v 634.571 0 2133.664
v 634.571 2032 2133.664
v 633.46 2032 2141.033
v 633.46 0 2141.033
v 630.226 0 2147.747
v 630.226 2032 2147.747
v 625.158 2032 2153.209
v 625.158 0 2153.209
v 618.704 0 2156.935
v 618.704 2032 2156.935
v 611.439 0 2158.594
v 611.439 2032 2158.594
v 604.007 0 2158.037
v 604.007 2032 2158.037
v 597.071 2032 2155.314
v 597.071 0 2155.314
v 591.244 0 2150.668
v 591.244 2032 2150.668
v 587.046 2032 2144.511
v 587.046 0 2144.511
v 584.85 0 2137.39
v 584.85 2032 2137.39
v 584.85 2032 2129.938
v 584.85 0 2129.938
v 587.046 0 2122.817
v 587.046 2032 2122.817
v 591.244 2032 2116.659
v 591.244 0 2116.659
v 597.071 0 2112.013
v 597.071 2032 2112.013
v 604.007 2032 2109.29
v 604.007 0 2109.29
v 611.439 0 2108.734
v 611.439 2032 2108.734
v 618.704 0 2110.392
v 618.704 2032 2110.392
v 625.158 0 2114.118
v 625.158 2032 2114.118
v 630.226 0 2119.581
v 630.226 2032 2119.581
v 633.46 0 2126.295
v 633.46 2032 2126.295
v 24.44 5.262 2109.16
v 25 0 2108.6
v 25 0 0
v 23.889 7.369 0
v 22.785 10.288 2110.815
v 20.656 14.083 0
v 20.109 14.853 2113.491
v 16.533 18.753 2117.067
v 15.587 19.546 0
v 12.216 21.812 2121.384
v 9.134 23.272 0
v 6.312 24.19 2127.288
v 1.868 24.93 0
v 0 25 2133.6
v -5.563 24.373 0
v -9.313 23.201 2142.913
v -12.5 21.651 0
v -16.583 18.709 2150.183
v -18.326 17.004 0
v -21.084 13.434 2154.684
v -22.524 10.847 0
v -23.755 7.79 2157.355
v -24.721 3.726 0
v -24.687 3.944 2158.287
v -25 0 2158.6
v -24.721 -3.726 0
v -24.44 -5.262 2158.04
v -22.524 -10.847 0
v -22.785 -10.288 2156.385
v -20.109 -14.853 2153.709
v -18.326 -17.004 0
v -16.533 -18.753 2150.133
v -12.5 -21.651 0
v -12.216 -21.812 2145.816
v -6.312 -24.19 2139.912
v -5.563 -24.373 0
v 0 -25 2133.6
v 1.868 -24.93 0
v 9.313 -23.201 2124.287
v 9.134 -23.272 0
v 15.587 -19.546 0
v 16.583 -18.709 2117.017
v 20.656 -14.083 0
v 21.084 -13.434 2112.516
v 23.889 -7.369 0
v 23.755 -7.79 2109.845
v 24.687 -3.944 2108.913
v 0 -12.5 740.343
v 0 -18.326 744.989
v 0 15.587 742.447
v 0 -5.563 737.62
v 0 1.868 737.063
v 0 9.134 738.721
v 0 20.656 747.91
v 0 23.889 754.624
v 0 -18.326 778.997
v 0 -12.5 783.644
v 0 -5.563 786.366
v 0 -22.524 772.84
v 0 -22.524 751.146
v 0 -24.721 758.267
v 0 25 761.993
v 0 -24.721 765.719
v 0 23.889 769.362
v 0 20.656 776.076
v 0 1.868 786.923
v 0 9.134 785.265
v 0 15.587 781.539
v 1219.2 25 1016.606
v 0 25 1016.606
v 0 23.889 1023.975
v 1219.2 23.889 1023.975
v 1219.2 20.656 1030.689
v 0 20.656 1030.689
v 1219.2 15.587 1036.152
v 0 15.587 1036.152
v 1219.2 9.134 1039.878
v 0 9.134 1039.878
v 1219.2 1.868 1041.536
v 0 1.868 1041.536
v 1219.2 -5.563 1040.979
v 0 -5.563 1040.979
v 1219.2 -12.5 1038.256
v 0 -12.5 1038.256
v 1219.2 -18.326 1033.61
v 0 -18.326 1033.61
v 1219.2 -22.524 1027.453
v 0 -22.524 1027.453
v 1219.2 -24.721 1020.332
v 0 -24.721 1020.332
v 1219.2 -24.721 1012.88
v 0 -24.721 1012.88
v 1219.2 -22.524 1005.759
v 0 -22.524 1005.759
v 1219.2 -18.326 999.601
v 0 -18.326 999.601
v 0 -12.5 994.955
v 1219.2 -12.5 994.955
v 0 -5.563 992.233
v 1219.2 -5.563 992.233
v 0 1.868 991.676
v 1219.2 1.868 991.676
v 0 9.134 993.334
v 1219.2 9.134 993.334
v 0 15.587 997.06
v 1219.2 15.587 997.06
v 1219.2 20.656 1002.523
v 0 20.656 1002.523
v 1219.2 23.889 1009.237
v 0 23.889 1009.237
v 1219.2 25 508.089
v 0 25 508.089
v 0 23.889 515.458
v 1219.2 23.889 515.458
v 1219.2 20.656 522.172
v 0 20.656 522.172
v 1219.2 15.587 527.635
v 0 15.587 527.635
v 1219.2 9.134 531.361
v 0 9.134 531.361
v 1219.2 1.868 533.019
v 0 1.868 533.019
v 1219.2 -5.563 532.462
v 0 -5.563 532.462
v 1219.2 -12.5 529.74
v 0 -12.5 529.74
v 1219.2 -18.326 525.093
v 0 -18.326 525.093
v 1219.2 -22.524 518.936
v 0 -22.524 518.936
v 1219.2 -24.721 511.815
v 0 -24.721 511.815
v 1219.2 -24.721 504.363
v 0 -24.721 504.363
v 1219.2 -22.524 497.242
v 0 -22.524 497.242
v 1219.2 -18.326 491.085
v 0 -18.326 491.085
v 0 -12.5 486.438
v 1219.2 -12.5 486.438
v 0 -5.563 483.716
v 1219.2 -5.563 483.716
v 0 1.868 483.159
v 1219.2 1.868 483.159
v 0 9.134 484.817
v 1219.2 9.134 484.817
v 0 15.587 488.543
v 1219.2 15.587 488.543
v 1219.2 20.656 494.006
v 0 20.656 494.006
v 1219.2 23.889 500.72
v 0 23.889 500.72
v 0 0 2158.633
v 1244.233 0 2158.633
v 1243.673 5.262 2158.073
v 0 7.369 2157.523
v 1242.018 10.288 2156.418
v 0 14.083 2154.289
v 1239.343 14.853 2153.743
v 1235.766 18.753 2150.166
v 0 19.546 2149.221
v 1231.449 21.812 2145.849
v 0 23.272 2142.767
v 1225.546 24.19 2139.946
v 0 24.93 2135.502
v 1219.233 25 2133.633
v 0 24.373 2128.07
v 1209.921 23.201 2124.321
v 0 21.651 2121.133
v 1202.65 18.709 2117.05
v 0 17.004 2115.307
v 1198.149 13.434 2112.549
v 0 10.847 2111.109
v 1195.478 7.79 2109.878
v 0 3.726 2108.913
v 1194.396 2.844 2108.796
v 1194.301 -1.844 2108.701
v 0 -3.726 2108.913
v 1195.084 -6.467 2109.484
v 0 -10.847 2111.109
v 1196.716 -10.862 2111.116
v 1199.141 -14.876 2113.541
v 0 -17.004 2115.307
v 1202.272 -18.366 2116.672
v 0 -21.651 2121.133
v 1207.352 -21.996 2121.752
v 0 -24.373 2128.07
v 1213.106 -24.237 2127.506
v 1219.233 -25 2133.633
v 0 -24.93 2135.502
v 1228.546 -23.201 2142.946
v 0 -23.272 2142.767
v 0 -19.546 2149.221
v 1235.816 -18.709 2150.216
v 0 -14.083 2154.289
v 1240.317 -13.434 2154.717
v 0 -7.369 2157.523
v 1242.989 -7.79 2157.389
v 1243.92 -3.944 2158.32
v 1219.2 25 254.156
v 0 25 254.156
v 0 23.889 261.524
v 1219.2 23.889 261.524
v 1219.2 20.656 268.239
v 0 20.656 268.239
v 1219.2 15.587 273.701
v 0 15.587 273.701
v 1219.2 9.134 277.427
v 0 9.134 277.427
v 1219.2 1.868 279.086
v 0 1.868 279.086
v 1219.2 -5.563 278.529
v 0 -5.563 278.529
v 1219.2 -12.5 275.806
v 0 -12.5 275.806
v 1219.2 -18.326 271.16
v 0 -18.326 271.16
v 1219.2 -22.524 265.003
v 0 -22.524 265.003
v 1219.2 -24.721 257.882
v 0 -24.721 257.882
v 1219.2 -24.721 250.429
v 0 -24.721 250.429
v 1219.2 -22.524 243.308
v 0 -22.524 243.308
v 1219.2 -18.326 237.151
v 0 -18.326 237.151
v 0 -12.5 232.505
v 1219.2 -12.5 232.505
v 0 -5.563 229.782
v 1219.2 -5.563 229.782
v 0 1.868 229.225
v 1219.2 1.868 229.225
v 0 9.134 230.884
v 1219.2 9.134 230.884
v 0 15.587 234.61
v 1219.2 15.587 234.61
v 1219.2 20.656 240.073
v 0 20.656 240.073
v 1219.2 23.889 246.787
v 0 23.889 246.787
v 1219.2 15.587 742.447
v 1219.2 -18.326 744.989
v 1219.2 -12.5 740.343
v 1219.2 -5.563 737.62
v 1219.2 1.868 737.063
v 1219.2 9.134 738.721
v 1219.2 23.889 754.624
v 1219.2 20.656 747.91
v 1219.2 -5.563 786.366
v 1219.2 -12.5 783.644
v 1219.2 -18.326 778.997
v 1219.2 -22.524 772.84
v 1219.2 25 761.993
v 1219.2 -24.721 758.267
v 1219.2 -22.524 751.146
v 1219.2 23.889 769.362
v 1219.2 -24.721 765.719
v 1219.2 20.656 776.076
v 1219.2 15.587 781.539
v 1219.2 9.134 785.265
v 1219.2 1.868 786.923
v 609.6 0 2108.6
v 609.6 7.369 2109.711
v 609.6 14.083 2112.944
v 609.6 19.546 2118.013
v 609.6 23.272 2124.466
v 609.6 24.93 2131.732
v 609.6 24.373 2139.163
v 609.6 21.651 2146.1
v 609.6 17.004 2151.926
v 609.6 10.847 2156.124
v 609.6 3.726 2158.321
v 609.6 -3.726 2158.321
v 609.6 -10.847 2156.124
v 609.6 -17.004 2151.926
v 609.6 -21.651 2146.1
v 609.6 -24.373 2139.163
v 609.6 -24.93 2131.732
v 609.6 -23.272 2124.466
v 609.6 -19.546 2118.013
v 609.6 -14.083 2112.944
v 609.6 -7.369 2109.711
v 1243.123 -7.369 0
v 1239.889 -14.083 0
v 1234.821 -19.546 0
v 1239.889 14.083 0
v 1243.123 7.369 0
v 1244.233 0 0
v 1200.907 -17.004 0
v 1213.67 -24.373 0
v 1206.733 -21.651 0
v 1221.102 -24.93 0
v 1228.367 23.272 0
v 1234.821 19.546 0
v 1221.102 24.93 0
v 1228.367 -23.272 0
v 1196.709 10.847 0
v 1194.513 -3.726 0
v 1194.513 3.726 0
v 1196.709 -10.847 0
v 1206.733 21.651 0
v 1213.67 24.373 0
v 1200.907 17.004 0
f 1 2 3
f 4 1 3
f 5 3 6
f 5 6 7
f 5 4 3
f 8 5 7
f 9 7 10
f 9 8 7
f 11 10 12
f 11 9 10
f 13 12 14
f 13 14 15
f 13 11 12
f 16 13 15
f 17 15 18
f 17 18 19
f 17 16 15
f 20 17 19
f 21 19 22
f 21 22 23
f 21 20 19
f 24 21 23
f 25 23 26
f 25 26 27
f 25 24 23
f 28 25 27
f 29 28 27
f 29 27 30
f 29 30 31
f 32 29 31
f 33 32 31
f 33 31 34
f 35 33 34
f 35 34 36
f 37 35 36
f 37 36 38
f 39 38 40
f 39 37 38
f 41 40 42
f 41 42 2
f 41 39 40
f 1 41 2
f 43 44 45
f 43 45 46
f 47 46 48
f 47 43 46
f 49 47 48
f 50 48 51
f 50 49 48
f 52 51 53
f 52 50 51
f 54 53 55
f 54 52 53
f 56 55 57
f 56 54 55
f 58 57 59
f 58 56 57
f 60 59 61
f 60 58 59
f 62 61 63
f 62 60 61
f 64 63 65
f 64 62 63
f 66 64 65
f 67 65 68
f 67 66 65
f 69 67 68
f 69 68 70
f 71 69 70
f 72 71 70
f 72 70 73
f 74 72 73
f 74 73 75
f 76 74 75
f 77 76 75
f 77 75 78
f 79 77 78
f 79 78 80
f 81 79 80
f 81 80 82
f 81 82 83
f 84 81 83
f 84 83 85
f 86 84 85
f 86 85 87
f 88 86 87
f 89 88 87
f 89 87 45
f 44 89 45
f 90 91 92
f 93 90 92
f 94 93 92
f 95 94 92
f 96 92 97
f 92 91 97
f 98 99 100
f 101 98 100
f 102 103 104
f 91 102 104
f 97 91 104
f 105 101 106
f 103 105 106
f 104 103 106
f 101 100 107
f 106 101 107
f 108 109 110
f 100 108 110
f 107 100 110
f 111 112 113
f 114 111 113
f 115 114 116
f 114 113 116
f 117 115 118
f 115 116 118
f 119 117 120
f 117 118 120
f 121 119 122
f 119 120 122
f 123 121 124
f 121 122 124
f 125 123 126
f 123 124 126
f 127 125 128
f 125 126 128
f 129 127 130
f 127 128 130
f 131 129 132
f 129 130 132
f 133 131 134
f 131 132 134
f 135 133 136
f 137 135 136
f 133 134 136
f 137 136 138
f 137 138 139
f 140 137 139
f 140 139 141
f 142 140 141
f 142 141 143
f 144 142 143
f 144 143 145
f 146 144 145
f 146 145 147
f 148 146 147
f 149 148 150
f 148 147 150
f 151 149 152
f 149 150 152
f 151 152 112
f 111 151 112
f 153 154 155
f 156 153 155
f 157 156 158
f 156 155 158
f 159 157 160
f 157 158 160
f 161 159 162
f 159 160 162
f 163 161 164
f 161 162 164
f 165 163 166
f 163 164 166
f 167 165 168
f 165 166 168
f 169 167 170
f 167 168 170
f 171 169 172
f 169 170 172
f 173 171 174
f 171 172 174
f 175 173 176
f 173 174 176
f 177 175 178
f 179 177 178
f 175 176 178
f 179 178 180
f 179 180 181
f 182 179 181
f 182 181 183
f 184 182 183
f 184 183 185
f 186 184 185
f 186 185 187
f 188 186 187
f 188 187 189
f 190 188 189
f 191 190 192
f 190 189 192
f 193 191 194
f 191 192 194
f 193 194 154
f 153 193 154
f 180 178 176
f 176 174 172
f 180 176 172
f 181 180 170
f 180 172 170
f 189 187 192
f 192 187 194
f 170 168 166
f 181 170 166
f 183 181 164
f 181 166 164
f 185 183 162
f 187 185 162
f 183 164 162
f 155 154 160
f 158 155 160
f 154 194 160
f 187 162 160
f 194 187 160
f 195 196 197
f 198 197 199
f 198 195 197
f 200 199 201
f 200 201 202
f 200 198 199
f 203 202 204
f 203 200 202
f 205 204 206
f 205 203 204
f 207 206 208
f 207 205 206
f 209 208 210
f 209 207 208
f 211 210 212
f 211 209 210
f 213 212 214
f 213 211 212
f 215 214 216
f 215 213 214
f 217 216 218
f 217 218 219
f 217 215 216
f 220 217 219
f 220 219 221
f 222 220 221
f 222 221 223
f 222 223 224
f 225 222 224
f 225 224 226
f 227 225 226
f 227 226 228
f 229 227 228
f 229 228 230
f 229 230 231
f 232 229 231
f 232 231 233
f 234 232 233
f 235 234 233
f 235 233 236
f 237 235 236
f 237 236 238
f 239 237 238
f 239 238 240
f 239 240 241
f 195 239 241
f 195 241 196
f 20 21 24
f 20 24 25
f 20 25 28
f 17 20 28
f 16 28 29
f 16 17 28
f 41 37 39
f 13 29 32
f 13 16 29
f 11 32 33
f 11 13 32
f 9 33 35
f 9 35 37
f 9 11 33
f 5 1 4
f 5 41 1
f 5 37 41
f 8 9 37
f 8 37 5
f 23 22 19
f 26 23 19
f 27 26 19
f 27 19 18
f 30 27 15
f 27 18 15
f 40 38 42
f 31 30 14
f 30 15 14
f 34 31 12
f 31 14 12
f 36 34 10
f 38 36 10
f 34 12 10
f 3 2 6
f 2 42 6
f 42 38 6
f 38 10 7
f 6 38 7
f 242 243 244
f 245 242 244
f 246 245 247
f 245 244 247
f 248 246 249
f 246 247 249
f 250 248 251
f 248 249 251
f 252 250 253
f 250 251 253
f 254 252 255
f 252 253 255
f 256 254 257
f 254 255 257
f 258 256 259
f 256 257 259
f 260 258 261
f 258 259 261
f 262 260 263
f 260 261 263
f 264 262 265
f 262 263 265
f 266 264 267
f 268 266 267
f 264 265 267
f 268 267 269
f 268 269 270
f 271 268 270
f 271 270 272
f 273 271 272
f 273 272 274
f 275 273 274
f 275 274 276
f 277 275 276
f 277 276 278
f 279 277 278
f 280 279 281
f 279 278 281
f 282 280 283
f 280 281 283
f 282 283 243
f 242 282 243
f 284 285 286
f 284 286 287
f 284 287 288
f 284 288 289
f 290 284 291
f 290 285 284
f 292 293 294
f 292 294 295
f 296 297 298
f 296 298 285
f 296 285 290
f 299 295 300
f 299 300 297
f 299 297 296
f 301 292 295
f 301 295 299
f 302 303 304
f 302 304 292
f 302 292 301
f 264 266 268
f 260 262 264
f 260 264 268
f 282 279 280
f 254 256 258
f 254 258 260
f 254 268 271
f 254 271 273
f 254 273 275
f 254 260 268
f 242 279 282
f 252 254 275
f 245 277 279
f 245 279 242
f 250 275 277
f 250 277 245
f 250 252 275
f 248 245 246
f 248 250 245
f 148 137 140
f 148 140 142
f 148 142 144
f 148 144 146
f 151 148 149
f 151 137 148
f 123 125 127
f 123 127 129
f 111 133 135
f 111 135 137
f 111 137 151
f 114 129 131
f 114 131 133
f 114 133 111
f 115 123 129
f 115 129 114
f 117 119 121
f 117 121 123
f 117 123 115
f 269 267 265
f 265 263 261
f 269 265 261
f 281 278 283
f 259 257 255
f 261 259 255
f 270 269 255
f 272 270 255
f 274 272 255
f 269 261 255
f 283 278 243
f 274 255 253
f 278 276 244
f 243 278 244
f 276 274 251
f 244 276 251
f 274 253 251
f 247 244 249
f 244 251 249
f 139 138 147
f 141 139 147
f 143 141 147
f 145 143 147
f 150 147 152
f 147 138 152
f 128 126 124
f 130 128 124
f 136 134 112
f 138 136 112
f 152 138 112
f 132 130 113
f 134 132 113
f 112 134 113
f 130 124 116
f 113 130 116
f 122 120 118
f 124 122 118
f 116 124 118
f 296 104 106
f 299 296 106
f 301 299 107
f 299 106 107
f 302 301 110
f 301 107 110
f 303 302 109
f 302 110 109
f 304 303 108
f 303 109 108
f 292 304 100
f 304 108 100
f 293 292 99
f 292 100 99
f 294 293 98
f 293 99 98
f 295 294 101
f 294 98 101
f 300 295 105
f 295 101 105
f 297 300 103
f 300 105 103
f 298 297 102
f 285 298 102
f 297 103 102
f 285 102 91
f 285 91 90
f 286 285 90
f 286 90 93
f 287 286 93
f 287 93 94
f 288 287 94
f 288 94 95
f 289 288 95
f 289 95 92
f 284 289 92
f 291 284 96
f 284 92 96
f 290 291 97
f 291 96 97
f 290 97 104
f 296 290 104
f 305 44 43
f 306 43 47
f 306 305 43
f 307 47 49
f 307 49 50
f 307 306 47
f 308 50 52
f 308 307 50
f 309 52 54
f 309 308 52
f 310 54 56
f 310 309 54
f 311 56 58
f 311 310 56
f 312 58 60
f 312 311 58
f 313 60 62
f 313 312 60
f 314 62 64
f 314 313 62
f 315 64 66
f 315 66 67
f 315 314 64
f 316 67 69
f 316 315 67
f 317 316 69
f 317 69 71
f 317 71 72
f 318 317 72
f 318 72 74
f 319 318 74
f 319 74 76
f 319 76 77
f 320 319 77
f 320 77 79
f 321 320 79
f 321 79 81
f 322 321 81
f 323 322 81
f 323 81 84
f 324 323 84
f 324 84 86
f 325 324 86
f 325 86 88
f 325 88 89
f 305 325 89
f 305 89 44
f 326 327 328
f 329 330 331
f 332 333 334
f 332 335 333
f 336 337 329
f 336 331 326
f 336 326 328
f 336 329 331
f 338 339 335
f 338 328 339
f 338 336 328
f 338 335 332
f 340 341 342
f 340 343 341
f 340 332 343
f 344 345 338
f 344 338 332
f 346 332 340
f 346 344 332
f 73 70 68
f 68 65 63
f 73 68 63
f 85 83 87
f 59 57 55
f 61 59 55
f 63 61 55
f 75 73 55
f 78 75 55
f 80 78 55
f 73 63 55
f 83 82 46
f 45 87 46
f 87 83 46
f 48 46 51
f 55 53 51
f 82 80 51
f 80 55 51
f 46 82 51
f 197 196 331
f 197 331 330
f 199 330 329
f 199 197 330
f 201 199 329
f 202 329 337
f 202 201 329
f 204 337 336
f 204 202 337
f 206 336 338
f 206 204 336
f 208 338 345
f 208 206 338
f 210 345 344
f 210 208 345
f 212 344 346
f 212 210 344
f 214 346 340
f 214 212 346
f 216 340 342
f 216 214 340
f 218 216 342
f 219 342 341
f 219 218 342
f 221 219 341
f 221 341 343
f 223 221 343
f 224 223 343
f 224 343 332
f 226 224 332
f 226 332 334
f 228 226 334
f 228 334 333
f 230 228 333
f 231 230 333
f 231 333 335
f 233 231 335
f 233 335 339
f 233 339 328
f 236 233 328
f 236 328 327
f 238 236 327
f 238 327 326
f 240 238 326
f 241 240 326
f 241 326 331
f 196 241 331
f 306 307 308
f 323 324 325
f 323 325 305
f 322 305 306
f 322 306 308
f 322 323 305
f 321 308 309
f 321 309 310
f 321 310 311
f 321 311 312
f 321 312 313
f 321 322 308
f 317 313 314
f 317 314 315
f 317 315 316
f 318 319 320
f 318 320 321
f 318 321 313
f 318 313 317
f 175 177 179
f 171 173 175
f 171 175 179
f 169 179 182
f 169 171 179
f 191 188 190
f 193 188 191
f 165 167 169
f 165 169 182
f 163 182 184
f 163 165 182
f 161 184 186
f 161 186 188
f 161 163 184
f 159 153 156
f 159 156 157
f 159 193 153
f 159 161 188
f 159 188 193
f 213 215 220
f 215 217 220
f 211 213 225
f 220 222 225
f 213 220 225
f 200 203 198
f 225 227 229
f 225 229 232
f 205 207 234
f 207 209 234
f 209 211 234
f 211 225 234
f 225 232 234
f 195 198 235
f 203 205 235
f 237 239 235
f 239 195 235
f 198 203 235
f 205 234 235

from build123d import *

# Parameters (mm, degrees)
F2_R      = 25
F3_DEPTH  = 2032
F0_R      = 25
F6_R      = 25
F9_R      = 25
F10_DEPTH = 1219.2


with BuildPart() as f3:
    # F2 (on Front) → F3 (new body)
    with BuildSketch(Plane.XZ):
        with Locations((609.5705032349, 2133.6636543274)):
            Circle(F2_R)
    extrude(amount=-F3_DEPTH)


with BuildPart() as f4:
    # F4: sweep along a path in F1
    with BuildLine(Plane.XZ) as f4_path:
        Line((0, 0), (0, 2133.6))
        Line((0, 2133.6), (609.6, 2133.6))
    # F0 (on Top) → F4 (sweep)
    with BuildSketch(Plane.XY):
        Circle(F0_R)
    sweep(path=f4_path.line, transition=Transition.RIGHT)


with BuildPart() as f7:
    # F7: sweep along a path in F1
    with BuildLine(Plane.XZ) as f7_path:
        Line((1219.2, 0), (1219.2, 2133.6))
        Line((1219.2, 2133.6), (0, 2133.6))
    # F6 (on line) → F7 (sweep)
    with BuildSketch(Plane(origin=(0, 0, 0), x_dir=(1, 0, 0), z_dir=(0, 0, -1))):
        with Locations((1219.2332744598, 0)):
            Circle(F6_R)
    sweep(path=f7_path.line, transition=Transition.RIGHT)


with BuildPart() as f10:
    # F9 (on line) → F10 (new body)
    with BuildSketch(Plane.YZ):
        with Locations((0, 1016.6057348251)):
            Circle(F9_R)
    extrude(amount=F10_DEPTH)


with BuildPart() as f10b:
    # F9 (on line) → F10, piece 2 (new body)
    with BuildSketch(Plane.YZ):
        with Locations((0, 761.9931697845)):
            Circle(F9_R)
    extrude(amount=F10_DEPTH)


with BuildPart() as f10c:
    # F9 (on line) → F10, piece 3 (new body)
    with BuildSketch(Plane.YZ):
        with Locations((0, 508.0889463425)):
            Circle(F9_R)
    extrude(amount=F10_DEPTH)


with BuildPart() as f10d:
    # F9 (on line) → F10, piece 4 (new body)
    with BuildSketch(Plane.YZ):
        with Locations((0, 254.1555166245)):
            Circle(F9_R)
    extrude(amount=F10_DEPTH)


solid = Compound([f3.part, f4.part, f7.part, f10.part, f10b.part, f10c.part, f10d.part])
